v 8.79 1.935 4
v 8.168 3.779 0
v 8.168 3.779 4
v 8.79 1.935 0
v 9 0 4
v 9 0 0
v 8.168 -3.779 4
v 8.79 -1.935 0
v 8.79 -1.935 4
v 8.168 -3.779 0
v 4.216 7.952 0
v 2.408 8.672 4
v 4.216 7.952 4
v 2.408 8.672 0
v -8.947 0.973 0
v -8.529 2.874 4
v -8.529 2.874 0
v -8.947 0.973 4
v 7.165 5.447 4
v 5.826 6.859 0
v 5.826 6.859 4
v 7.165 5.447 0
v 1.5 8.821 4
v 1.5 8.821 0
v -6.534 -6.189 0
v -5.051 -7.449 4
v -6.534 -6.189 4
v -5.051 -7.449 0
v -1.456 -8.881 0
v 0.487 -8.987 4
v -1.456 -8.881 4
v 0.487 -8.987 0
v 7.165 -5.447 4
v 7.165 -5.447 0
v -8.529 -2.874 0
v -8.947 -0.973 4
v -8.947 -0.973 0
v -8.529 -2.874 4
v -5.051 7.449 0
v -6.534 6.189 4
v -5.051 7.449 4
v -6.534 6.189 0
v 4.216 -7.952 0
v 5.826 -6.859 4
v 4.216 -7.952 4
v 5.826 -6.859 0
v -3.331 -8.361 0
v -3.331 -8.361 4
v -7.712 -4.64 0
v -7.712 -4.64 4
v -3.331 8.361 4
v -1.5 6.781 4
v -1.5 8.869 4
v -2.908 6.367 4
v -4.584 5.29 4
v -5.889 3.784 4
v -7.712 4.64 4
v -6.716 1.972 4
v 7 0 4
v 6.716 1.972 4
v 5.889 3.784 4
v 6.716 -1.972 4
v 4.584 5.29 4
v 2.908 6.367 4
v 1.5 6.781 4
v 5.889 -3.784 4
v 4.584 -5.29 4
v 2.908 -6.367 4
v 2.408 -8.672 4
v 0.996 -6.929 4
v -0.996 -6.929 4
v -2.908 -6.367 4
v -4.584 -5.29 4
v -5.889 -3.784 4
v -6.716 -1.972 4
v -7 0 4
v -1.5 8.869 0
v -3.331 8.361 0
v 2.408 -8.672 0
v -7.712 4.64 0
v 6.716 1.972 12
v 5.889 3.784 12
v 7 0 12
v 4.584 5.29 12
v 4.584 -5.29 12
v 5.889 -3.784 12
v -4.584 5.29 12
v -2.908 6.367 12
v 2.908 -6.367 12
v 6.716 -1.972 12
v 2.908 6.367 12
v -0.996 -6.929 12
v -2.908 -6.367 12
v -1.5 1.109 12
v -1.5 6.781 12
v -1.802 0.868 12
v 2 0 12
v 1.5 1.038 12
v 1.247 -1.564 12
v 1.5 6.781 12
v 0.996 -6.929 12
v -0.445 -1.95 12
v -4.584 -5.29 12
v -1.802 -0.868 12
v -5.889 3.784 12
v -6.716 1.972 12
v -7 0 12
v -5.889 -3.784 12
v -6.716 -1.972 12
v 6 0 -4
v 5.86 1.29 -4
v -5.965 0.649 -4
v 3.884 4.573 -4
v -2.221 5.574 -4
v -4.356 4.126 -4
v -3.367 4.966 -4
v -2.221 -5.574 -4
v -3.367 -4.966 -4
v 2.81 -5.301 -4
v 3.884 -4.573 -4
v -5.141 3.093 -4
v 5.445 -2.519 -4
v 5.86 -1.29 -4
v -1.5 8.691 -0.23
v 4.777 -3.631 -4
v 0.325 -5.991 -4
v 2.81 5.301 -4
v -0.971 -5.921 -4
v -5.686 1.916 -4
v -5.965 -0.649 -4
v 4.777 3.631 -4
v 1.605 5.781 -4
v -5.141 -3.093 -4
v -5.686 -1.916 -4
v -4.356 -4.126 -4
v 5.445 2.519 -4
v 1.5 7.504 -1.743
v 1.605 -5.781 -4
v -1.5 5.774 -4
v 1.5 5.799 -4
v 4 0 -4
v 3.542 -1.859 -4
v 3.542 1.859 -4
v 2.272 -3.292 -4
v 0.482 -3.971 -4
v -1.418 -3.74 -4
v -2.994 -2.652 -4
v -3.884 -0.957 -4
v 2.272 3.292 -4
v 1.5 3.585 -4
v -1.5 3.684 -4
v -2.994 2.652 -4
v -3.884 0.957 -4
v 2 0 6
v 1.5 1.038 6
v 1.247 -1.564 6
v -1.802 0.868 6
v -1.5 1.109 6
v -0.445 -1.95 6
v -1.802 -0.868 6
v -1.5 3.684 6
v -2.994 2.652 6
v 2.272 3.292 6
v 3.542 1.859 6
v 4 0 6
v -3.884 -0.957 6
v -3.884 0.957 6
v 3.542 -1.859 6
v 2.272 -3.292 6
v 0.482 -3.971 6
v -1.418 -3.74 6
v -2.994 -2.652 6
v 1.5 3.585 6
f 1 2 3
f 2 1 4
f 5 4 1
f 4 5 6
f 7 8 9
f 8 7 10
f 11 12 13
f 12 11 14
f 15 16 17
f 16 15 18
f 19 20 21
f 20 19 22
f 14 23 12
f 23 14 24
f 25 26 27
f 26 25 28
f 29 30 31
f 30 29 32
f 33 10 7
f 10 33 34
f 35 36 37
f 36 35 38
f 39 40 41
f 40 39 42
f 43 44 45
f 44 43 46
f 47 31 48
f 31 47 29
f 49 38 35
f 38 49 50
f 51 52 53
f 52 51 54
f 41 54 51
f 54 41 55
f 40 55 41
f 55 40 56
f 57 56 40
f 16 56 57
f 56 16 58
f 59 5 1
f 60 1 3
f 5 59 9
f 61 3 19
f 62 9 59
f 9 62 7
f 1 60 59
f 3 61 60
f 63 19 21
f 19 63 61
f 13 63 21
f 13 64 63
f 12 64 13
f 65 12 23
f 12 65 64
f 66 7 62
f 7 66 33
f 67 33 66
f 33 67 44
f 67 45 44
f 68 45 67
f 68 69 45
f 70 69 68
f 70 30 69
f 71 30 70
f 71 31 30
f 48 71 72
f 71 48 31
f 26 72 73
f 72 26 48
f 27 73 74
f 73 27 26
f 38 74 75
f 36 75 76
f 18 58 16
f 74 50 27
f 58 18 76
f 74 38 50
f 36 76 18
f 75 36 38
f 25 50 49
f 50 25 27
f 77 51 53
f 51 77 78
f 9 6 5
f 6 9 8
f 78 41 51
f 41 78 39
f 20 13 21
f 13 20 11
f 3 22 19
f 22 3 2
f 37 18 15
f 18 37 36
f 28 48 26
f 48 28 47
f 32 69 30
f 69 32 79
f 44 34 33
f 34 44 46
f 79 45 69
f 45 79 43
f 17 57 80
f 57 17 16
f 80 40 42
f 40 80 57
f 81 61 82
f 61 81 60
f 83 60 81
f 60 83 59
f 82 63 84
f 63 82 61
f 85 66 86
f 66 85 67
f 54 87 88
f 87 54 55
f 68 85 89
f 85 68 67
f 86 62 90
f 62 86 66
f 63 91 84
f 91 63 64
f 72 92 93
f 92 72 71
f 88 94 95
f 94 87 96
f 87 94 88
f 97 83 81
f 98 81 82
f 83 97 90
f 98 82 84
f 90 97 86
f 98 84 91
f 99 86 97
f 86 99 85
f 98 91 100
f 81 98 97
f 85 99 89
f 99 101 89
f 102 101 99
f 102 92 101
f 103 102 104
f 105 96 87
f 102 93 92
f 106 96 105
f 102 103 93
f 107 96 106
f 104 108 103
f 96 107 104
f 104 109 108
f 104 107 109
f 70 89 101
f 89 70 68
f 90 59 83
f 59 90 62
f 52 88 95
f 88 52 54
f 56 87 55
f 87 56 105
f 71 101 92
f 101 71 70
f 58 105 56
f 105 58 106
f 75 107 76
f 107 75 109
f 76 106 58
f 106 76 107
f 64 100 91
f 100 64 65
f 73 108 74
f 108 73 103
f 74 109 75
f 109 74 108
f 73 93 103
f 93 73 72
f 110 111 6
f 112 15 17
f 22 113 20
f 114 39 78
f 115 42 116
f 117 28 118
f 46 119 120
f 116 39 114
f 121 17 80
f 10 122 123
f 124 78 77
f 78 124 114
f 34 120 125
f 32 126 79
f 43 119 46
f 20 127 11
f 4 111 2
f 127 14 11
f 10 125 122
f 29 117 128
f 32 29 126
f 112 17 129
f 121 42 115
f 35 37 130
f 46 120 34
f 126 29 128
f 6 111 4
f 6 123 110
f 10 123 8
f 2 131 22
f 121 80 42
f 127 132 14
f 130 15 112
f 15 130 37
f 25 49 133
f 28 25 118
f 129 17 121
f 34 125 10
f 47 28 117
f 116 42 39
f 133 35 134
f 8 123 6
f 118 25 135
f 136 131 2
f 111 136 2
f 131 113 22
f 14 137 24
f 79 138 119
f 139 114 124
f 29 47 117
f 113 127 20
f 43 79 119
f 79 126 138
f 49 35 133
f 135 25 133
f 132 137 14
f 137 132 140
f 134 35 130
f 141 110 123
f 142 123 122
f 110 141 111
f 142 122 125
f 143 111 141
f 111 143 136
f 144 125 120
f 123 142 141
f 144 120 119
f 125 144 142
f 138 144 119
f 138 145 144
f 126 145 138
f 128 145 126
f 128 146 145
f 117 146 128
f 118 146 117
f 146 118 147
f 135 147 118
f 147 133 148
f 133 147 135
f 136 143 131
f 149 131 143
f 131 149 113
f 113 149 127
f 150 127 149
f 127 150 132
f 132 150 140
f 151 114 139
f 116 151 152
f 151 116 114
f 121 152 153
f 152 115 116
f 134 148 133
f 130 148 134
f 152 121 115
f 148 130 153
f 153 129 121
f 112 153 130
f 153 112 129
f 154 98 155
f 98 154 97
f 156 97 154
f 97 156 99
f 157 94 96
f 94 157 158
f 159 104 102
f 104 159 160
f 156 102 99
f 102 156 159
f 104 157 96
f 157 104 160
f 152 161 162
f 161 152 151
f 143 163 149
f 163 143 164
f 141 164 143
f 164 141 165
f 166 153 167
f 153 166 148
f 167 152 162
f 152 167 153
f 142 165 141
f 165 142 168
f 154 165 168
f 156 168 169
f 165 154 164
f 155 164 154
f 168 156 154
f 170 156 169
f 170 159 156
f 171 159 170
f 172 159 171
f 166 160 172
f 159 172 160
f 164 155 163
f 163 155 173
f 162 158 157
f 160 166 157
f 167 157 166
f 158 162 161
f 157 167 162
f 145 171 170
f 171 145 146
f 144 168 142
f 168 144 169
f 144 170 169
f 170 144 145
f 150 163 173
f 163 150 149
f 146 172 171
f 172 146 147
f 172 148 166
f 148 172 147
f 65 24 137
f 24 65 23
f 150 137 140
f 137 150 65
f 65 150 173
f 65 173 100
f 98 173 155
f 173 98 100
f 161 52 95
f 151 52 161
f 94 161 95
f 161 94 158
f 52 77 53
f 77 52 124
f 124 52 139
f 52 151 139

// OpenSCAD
difference () {
    union() {
        cylinder(4, 9, 9, false);
        cylinder(12, 7, 7, false);
        translate ([0,0,-4]) {
            cylinder(4, 6, 9, false);
        }
    }
    
    union() {
        cylinder(50, 2, 2, true);
        cylinder(12, 4, 4, true);
        translate([0, 12.5 ,0]) {
            cube([3, 25, 45], true);
        }
        
    }
    
    
    
}
